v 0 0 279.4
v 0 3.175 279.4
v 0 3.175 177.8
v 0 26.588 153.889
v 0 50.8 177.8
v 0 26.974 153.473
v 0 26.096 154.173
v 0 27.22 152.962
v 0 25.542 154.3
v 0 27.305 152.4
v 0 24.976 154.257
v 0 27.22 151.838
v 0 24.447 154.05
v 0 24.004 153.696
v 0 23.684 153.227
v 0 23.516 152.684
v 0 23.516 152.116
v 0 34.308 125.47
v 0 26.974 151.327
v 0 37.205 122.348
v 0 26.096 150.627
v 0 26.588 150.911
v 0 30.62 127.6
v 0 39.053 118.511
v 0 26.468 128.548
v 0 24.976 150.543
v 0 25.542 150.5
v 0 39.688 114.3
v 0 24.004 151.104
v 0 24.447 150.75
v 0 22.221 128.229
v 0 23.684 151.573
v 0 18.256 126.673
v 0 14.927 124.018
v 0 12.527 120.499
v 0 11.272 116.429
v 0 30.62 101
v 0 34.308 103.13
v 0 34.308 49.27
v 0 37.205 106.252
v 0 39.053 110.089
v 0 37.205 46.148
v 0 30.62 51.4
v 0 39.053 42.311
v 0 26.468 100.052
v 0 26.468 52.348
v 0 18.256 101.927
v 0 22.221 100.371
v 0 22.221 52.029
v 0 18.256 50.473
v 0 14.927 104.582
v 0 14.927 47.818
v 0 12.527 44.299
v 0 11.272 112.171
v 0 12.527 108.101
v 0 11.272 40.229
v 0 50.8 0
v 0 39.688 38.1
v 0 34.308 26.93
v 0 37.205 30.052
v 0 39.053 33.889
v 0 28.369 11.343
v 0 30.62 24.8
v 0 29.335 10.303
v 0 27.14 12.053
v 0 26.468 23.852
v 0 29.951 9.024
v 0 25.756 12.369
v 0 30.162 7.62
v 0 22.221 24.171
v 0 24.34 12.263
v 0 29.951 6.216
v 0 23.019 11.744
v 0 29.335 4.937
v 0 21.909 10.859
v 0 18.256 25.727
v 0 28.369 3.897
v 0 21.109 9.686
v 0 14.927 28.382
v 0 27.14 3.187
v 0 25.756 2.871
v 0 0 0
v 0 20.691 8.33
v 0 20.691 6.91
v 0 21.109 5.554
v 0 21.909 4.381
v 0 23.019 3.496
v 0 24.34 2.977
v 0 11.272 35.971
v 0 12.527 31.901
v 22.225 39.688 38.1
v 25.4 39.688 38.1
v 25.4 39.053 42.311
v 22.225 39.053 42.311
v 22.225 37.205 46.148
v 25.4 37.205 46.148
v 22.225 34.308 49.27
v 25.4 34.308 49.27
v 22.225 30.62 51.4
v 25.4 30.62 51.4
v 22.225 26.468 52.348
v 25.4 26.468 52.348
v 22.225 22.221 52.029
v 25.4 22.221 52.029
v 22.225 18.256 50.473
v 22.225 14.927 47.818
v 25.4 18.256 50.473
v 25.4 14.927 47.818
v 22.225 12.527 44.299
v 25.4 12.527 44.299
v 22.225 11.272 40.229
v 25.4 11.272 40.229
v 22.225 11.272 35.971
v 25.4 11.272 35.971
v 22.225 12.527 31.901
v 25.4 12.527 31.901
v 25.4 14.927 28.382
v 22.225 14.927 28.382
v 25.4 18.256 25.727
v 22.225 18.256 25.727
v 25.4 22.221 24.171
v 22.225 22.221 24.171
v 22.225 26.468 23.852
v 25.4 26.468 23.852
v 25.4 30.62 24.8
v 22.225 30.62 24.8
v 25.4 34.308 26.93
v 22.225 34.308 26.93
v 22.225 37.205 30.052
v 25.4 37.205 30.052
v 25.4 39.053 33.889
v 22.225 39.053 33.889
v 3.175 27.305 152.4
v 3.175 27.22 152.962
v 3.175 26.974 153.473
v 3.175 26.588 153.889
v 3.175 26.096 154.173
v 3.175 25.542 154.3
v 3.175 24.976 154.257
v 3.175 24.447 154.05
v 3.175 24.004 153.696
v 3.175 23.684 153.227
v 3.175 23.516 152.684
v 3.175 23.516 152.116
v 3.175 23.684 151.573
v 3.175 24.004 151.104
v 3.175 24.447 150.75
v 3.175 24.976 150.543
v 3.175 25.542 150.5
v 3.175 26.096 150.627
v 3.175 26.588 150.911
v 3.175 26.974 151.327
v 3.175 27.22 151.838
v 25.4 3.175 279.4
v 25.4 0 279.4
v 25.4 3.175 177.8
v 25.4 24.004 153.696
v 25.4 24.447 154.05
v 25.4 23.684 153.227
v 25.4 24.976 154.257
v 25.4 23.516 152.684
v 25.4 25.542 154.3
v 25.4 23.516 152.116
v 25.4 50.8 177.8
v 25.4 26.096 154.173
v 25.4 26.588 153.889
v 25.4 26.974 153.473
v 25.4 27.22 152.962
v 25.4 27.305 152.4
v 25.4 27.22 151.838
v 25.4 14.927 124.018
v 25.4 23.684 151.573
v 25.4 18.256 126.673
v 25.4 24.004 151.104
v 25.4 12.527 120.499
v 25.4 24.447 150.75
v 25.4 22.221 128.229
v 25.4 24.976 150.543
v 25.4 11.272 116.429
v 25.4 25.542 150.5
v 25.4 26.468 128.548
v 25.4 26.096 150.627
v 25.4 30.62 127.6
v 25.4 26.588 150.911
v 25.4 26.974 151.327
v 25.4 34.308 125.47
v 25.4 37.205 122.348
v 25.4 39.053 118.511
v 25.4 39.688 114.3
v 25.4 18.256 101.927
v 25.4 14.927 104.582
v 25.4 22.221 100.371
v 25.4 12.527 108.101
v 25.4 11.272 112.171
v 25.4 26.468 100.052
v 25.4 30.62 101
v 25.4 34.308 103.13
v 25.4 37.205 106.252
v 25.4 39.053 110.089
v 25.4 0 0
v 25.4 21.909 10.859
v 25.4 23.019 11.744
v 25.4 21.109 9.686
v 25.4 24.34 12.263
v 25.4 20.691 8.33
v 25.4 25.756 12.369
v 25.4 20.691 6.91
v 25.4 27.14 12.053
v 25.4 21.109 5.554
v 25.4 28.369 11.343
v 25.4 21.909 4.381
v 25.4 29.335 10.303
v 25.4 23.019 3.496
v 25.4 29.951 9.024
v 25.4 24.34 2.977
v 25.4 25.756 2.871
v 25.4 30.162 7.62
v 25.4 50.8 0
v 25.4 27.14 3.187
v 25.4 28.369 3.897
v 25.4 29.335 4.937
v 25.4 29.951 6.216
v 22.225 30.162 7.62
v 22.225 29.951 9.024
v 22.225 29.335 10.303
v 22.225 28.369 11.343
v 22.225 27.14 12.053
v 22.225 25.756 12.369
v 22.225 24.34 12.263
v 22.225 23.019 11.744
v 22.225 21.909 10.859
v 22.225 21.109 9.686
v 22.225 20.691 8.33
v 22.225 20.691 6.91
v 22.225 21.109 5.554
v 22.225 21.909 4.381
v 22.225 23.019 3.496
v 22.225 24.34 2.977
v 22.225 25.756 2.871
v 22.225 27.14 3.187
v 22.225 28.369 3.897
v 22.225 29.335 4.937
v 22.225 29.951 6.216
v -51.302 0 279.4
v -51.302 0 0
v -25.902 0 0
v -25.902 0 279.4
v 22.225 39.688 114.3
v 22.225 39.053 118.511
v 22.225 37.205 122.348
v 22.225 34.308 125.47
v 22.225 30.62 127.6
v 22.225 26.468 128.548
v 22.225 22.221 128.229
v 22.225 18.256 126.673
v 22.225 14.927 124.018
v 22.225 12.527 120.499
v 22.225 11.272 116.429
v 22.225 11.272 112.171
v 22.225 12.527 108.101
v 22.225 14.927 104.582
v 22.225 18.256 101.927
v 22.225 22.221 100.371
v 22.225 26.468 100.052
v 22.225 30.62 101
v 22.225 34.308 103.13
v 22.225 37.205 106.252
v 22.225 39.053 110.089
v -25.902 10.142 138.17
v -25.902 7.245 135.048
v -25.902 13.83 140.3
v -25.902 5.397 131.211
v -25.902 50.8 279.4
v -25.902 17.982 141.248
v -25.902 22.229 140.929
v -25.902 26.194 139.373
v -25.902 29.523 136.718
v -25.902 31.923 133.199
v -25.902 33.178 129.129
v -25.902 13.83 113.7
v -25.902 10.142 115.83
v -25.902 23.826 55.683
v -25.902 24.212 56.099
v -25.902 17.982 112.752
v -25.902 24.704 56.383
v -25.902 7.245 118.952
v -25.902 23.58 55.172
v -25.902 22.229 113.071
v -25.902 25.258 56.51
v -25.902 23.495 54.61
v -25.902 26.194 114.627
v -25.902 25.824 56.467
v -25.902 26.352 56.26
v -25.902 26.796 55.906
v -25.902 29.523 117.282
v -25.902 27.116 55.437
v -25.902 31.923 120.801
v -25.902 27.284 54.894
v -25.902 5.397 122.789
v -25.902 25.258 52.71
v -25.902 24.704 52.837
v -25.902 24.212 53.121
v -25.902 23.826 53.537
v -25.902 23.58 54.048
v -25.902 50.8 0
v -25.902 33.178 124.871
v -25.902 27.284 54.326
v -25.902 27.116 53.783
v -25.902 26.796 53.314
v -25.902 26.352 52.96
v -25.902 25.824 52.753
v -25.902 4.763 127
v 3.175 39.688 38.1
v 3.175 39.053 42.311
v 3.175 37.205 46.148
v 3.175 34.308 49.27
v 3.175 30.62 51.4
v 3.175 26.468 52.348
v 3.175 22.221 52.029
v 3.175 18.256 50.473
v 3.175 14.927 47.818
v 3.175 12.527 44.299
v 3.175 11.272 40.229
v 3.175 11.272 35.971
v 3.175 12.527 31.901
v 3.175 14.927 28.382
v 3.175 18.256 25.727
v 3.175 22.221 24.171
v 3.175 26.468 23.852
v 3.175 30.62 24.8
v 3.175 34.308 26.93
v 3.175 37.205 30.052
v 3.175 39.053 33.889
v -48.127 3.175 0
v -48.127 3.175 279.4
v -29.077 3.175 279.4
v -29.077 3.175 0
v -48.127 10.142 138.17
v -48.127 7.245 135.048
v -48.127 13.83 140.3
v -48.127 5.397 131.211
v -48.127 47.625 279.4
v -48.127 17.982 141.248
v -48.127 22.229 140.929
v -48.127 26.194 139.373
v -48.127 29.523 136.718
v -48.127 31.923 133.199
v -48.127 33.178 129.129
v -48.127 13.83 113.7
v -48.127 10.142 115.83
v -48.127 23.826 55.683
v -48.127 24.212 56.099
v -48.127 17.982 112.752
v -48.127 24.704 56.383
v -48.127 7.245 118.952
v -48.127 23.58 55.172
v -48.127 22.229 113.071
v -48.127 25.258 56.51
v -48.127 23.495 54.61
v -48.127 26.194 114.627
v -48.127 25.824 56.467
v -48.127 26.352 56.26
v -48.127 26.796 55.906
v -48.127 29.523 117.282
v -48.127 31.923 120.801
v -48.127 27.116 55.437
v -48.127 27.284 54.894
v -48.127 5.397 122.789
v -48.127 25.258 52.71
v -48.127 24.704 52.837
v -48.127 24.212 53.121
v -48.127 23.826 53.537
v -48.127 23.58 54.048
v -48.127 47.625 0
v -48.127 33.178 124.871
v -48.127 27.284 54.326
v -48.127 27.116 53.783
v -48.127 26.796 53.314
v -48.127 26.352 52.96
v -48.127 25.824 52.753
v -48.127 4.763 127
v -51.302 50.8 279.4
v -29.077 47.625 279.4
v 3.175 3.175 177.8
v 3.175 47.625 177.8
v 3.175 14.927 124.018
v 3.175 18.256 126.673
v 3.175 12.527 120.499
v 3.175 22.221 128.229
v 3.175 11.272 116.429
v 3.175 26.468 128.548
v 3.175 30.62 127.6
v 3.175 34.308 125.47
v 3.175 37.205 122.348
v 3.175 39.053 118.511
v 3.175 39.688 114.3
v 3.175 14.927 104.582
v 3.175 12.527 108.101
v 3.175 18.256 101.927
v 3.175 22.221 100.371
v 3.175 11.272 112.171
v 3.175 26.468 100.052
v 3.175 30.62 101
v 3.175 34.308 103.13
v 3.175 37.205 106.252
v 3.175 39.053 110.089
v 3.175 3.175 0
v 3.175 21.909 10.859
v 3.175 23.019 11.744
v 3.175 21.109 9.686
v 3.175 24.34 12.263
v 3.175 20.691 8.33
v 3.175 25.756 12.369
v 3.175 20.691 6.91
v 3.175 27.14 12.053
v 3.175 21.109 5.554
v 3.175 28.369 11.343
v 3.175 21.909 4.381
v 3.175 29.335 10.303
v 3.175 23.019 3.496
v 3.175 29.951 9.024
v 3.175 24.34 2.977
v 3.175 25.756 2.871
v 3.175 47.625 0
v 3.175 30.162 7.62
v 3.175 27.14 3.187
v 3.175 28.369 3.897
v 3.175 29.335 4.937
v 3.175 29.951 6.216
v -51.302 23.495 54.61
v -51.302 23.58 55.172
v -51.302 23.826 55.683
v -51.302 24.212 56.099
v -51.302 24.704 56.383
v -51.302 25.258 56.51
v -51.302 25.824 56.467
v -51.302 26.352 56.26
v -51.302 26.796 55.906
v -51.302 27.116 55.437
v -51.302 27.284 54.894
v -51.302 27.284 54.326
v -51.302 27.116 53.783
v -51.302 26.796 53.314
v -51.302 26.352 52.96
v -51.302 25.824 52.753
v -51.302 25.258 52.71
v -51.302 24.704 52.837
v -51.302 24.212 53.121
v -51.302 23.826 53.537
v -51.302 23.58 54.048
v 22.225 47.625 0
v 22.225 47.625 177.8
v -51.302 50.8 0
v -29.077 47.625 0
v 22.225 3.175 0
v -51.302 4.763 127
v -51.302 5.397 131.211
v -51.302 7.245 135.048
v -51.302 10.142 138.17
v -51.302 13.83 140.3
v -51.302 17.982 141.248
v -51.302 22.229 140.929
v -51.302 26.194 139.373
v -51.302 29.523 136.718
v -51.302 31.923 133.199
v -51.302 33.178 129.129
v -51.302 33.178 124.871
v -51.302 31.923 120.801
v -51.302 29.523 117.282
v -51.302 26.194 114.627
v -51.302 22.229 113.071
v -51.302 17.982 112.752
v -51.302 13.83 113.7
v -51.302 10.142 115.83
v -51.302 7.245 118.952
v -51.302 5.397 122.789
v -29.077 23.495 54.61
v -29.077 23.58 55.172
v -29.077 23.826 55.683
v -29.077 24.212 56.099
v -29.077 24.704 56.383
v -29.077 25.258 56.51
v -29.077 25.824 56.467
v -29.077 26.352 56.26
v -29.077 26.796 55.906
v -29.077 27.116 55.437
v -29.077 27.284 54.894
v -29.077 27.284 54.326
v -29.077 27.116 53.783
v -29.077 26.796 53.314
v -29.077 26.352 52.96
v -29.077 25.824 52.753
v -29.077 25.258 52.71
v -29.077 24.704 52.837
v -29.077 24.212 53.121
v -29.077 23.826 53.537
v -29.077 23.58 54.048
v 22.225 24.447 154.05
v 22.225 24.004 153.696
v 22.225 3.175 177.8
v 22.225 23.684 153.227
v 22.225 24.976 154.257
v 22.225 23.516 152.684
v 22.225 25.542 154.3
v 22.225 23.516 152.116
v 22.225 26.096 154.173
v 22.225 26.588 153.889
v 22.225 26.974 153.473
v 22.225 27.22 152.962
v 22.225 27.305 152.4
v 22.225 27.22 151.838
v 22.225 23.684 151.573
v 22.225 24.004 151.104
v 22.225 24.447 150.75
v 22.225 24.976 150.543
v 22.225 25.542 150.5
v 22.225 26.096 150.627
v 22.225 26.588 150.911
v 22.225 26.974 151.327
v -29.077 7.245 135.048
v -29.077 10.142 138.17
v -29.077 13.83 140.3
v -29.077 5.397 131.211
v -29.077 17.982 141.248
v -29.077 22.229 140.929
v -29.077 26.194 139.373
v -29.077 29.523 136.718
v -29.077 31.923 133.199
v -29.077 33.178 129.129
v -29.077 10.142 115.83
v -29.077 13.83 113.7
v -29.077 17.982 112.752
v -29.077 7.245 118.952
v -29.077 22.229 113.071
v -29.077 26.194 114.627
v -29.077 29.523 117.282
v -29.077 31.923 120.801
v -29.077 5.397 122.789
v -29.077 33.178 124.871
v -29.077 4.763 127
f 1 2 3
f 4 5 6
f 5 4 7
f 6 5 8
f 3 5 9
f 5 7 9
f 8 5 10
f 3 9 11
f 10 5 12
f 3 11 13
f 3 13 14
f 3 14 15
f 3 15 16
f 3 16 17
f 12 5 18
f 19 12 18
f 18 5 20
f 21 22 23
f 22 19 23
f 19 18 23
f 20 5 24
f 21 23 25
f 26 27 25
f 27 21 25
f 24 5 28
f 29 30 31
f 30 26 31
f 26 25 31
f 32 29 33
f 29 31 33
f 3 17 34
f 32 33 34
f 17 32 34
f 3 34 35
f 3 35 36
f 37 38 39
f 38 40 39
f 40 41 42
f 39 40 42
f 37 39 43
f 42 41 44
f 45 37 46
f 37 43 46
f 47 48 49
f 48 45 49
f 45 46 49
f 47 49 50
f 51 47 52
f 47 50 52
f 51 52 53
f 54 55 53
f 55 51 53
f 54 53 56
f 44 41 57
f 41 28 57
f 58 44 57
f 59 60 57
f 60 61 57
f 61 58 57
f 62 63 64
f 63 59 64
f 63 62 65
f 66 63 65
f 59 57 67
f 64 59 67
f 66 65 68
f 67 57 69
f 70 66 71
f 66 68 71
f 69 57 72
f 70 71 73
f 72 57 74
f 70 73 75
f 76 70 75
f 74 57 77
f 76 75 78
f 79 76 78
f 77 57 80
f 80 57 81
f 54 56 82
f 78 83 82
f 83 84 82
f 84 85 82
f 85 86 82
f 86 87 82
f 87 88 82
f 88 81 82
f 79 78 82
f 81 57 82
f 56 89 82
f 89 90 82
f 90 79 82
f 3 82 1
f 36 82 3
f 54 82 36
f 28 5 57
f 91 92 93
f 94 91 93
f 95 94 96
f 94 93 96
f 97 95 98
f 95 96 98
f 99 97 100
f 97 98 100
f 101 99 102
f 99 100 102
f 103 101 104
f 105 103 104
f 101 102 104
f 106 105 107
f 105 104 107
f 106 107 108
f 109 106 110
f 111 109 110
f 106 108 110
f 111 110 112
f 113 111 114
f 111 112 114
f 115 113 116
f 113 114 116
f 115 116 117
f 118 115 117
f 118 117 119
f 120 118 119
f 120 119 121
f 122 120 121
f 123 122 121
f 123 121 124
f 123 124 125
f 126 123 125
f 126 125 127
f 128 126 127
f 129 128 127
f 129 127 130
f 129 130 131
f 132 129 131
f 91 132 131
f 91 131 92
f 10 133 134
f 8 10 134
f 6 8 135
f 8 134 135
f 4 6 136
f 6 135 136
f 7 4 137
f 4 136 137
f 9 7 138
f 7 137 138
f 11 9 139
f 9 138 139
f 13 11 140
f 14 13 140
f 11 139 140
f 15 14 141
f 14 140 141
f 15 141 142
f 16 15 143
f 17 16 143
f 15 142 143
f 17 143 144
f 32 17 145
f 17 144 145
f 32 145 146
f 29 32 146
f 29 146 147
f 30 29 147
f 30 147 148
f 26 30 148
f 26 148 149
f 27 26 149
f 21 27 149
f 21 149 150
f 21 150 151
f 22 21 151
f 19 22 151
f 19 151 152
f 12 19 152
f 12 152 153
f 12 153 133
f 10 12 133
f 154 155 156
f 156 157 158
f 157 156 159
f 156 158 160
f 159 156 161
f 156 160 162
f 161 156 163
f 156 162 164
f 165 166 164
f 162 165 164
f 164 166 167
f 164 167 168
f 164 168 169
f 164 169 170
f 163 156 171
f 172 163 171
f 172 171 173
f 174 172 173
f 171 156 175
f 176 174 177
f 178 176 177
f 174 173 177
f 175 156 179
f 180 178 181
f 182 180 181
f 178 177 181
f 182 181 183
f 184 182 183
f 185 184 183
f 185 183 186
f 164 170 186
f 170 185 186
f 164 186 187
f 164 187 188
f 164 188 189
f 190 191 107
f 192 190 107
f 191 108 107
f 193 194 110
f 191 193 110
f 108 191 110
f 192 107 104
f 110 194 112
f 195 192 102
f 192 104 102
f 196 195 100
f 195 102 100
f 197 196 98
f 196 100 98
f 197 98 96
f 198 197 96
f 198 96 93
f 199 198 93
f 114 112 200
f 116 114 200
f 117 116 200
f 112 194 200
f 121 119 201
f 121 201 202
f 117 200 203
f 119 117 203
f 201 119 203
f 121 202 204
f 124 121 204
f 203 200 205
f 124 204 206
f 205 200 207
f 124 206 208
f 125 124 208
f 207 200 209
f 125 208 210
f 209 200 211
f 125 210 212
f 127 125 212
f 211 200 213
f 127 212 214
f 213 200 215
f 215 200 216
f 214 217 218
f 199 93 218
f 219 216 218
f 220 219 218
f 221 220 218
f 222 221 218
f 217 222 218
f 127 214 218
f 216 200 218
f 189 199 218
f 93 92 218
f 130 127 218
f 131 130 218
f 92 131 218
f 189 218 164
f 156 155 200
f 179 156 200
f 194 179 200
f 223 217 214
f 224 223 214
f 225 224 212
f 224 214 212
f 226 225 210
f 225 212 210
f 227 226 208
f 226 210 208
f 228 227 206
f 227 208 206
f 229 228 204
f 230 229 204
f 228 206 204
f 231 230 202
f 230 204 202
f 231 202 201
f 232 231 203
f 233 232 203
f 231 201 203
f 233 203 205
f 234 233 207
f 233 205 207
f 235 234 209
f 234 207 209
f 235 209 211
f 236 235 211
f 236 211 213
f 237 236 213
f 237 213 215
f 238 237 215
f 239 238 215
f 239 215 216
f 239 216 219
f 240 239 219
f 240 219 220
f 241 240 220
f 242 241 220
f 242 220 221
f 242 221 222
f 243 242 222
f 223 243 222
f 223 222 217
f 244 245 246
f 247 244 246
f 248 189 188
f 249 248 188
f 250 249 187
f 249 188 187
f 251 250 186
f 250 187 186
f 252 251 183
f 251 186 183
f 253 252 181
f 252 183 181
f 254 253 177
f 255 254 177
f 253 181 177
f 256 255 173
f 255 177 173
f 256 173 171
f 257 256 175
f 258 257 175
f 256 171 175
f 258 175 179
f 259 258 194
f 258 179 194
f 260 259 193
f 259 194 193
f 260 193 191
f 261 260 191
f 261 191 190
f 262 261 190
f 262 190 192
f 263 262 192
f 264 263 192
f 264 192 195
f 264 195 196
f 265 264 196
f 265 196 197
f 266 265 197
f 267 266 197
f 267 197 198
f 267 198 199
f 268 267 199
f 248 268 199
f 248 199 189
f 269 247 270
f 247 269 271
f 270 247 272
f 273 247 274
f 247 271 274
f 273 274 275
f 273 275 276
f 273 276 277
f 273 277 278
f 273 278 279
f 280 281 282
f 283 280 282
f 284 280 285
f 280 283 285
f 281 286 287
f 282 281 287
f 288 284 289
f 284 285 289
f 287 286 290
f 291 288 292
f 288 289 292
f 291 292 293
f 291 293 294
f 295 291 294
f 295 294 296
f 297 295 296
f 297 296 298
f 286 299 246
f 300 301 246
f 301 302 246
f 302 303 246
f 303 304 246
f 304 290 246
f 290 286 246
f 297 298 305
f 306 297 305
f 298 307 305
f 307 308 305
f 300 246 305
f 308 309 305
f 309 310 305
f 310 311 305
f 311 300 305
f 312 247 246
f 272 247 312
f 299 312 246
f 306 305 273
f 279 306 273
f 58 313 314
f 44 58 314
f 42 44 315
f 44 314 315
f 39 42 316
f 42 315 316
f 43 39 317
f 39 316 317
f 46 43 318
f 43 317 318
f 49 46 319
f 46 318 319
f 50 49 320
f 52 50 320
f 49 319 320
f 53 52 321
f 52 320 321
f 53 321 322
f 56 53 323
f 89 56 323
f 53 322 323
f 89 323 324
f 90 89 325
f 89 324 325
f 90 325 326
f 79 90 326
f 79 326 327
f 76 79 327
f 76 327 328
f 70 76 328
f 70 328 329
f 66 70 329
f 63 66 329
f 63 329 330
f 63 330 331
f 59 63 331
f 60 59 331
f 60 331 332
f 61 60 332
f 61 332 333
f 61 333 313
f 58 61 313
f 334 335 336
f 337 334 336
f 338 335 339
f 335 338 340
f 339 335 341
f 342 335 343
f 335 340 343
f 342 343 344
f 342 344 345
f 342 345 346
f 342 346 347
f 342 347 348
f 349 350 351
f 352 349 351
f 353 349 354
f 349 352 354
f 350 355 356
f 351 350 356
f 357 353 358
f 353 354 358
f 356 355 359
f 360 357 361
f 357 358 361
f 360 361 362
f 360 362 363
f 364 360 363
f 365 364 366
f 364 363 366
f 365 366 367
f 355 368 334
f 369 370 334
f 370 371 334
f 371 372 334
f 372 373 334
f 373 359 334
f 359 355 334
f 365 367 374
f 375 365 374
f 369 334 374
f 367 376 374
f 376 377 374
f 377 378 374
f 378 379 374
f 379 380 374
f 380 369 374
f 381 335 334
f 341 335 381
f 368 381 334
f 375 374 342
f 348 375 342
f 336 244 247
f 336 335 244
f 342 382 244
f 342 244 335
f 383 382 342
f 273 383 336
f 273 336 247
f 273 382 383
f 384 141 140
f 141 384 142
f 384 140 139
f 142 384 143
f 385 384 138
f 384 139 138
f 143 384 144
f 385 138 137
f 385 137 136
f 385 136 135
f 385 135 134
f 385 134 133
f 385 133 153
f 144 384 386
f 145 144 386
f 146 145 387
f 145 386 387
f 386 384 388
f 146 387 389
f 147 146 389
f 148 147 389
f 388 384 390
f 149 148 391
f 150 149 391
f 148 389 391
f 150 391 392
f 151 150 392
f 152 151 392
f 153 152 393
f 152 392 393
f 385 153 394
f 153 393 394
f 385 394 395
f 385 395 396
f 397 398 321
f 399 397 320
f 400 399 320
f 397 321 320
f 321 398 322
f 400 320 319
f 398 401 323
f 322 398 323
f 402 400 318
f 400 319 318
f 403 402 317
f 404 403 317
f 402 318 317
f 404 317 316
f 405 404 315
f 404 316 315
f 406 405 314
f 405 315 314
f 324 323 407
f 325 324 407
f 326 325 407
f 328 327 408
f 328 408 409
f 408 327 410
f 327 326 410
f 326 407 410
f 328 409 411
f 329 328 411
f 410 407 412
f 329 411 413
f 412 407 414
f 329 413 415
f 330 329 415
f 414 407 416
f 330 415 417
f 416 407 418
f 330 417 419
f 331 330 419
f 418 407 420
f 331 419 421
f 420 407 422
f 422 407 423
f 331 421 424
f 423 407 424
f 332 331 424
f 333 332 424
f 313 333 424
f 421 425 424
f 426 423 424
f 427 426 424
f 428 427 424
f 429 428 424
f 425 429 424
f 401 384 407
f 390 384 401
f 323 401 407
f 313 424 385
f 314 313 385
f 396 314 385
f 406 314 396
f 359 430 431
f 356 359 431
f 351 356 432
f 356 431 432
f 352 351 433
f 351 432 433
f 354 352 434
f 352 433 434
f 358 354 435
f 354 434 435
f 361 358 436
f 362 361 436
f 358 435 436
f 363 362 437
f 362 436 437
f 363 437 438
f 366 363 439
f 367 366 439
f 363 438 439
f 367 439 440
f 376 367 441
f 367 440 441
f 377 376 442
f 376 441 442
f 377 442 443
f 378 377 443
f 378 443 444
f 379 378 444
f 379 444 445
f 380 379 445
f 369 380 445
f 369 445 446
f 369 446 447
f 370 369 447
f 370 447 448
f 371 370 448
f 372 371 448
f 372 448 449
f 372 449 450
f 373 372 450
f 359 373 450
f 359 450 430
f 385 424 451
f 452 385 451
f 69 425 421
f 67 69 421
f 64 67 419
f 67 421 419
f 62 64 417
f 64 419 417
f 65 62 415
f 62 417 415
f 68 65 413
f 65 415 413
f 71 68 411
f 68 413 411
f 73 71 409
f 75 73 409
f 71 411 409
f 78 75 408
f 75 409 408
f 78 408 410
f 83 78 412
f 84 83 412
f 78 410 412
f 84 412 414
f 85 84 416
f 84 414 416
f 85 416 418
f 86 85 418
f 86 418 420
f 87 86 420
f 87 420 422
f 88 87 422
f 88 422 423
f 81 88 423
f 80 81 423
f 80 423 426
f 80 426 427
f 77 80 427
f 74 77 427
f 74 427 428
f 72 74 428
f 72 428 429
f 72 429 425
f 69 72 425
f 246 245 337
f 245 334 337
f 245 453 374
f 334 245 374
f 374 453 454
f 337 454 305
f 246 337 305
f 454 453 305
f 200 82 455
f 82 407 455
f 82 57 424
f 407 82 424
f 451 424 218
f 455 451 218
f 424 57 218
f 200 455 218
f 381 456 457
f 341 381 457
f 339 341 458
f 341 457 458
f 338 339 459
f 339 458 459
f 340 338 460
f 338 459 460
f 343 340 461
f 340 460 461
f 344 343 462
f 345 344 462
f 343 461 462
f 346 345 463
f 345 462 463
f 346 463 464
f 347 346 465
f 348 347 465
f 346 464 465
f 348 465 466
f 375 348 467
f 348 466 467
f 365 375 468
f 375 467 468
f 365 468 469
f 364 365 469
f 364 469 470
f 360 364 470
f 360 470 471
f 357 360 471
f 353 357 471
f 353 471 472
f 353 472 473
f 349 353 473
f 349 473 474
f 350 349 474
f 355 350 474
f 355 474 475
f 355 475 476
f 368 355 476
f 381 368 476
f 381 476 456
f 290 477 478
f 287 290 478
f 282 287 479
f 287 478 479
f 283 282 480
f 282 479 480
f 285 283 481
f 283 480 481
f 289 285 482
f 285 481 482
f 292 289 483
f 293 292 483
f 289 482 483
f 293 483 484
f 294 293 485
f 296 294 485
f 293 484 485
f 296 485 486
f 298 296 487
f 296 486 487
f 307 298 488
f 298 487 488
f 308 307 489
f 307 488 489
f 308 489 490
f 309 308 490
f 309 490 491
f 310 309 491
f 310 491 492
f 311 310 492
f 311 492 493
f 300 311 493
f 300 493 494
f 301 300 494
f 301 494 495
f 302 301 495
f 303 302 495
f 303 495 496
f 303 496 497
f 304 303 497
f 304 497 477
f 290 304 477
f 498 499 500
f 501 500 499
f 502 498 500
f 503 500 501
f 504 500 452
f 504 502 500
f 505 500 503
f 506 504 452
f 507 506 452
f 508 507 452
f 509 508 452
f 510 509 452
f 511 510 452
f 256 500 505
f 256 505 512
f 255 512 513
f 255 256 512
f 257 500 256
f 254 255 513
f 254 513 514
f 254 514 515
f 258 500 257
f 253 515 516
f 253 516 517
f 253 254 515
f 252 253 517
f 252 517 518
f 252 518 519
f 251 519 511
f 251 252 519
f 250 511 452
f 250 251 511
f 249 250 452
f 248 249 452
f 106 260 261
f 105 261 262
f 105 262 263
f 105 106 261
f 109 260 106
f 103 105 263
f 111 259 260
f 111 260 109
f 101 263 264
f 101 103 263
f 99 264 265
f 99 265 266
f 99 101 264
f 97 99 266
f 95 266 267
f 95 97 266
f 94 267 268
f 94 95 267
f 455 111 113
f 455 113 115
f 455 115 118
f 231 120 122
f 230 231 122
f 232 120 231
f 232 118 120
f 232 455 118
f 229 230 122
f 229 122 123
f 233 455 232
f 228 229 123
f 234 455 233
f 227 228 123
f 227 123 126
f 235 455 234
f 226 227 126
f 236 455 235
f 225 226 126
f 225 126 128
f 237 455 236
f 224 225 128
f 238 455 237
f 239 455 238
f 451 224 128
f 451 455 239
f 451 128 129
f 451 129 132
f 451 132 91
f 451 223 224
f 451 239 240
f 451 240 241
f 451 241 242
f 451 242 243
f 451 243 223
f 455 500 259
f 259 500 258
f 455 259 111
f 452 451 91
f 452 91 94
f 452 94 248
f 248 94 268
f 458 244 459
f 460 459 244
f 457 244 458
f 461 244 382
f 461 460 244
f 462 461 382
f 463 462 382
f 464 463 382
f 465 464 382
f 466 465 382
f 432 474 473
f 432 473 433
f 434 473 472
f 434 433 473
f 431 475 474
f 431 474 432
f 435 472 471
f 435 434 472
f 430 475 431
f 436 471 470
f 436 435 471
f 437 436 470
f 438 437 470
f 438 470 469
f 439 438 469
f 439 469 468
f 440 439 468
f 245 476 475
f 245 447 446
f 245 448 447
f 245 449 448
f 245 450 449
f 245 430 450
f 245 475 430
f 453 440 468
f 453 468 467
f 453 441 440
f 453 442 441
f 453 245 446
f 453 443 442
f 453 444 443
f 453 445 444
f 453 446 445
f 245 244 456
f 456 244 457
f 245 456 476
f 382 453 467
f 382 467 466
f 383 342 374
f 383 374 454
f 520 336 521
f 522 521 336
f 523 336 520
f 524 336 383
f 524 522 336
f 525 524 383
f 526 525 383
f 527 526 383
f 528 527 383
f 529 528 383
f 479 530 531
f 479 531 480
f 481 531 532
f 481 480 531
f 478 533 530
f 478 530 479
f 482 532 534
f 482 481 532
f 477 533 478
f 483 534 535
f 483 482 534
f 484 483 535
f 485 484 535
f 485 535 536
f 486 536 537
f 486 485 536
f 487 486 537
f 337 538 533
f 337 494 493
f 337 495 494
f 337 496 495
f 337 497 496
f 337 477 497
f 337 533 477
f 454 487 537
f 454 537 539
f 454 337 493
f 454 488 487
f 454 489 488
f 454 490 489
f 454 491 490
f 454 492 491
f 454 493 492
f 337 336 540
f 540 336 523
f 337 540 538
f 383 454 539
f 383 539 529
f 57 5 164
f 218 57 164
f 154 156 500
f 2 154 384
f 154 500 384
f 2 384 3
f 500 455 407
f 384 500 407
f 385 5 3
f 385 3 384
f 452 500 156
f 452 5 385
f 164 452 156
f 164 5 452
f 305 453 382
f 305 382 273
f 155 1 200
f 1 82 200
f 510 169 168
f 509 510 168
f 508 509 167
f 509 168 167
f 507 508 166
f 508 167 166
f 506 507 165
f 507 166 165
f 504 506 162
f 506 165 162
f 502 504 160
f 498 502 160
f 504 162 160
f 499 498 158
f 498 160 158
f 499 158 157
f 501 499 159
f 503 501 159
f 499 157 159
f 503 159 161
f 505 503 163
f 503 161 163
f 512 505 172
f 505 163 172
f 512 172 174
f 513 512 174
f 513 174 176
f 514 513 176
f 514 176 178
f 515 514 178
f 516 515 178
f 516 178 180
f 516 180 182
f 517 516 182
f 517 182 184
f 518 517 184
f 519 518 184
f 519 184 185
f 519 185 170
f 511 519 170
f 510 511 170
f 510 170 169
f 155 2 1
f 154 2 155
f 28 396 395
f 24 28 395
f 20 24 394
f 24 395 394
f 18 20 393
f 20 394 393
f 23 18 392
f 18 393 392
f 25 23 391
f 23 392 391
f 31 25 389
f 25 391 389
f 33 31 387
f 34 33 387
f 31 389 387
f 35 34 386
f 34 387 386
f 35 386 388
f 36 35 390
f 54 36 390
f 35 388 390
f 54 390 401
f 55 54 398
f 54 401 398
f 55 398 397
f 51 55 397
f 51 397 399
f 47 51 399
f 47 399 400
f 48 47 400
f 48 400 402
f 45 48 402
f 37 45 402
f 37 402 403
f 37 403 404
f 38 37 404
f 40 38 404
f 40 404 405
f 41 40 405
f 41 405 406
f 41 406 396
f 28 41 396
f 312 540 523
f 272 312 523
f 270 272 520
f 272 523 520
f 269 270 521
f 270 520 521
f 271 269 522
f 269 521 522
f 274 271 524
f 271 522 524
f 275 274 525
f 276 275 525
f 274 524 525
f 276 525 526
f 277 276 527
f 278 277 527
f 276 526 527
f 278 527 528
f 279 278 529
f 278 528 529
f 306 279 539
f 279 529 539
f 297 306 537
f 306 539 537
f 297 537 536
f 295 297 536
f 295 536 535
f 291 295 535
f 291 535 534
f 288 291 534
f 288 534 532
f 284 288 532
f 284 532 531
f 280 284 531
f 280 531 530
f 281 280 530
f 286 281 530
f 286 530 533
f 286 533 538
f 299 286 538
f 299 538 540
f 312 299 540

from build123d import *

# Parameters (mm, degrees)
F0_W      = 25.4
F0_H      = 50.8
F0_W_2    = 19.05
F0_H_2    = 44.45
F1_DEPTH  = 177.8
F2_R      = 1.905
F2_R_2    = 14.2875
F2_R_3    = 4.7625
F3_DEPTH  = 25.4
F4_W      = 25.4
F4_H      = 50.8
F4_W_2    = 19.05
F4_H_2    = 44.45
F5_DEPTH  = 279.4
F6_R      = 1.905
F7_DEPTH  = 25.4
F8_R      = 14.2875
F9_DEPTH  = 25.4
F11_DEPTH = 101.6


# Not quite as in the source:
# - a feature names something its author has since deleted; it is built from what else it names


with BuildPart() as f1:
    # F0 (on Top) → F1 (new body)
    with BuildSketch(Plane.XY):
        with Locations((12.7, 25.4)):
            Rectangle(F0_W, F0_H)
        with Locations((12.7, 25.4)):
            Rectangle(F0_W_2, F0_H_2, mode=Mode.SUBTRACT)
    extrude(amount=F1_DEPTH)

    # F2 (on face) → F3 (cut, through all)
    with BuildSketch(Plane.YZ.offset(25.4)):
        with Locations((25.4, 152.4)):
            Circle(F2_R)
        with Locations((25.4, 38.1)):
            Circle(F2_R_2)
        with Locations((25.4, 7.62)):
            Circle(F2_R_3)
        with Locations((25.4, 114.3)):
            Circle(F2_R_2)
    extrude(amount=-F3_DEPTH, mode=Mode.SUBTRACT)

    # F10 (on face) → F11 (join)
    with BuildSketch(Plane.XY.offset(177.8)):
        Polygon((0, 3.175), (0, 0), (25.4, 0), (25.4, 3.175), (22.225, 3.175), (3.175, 3.175), align=None)
    extrude(amount=F11_DEPTH)


with BuildPart() as f5:
    # F4 (on Top) → F5 (new body)
    with BuildSketch(Plane.XY):
        with Locations((-38.6022577927, 25.4)):
            Rectangle(F4_W, F4_H)
        with Locations((-38.6022577927, 25.4)):
            Rectangle(F4_W_2, F4_H_2, mode=Mode.SUBTRACT)
    extrude(amount=F5_DEPTH)

    # F6 (on face) → F7 (cut, through all)
    with BuildSketch(Plane(origin=(-51.3022577927, 0, 0), x_dir=(0, -1, 0), z_dir=(-1, 0, 0))):
        with Locations((-25.4, 54.61)):
            Circle(F6_R)
    extrude(amount=-F7_DEPTH, mode=Mode.SUBTRACT)

    # F8 (on face) → F9 (cut, through all)
    with BuildSketch(Plane(origin=(-51.3022577927, 0, 0), x_dir=(0, -1, 0), z_dir=(-1, 0, 0))):
        with Locations((-19.05, 127)):
            Circle(F8_R)
    extrude(amount=-F9_DEPTH, mode=Mode.SUBTRACT)


solid = Compound([f1.part, f5.part])
